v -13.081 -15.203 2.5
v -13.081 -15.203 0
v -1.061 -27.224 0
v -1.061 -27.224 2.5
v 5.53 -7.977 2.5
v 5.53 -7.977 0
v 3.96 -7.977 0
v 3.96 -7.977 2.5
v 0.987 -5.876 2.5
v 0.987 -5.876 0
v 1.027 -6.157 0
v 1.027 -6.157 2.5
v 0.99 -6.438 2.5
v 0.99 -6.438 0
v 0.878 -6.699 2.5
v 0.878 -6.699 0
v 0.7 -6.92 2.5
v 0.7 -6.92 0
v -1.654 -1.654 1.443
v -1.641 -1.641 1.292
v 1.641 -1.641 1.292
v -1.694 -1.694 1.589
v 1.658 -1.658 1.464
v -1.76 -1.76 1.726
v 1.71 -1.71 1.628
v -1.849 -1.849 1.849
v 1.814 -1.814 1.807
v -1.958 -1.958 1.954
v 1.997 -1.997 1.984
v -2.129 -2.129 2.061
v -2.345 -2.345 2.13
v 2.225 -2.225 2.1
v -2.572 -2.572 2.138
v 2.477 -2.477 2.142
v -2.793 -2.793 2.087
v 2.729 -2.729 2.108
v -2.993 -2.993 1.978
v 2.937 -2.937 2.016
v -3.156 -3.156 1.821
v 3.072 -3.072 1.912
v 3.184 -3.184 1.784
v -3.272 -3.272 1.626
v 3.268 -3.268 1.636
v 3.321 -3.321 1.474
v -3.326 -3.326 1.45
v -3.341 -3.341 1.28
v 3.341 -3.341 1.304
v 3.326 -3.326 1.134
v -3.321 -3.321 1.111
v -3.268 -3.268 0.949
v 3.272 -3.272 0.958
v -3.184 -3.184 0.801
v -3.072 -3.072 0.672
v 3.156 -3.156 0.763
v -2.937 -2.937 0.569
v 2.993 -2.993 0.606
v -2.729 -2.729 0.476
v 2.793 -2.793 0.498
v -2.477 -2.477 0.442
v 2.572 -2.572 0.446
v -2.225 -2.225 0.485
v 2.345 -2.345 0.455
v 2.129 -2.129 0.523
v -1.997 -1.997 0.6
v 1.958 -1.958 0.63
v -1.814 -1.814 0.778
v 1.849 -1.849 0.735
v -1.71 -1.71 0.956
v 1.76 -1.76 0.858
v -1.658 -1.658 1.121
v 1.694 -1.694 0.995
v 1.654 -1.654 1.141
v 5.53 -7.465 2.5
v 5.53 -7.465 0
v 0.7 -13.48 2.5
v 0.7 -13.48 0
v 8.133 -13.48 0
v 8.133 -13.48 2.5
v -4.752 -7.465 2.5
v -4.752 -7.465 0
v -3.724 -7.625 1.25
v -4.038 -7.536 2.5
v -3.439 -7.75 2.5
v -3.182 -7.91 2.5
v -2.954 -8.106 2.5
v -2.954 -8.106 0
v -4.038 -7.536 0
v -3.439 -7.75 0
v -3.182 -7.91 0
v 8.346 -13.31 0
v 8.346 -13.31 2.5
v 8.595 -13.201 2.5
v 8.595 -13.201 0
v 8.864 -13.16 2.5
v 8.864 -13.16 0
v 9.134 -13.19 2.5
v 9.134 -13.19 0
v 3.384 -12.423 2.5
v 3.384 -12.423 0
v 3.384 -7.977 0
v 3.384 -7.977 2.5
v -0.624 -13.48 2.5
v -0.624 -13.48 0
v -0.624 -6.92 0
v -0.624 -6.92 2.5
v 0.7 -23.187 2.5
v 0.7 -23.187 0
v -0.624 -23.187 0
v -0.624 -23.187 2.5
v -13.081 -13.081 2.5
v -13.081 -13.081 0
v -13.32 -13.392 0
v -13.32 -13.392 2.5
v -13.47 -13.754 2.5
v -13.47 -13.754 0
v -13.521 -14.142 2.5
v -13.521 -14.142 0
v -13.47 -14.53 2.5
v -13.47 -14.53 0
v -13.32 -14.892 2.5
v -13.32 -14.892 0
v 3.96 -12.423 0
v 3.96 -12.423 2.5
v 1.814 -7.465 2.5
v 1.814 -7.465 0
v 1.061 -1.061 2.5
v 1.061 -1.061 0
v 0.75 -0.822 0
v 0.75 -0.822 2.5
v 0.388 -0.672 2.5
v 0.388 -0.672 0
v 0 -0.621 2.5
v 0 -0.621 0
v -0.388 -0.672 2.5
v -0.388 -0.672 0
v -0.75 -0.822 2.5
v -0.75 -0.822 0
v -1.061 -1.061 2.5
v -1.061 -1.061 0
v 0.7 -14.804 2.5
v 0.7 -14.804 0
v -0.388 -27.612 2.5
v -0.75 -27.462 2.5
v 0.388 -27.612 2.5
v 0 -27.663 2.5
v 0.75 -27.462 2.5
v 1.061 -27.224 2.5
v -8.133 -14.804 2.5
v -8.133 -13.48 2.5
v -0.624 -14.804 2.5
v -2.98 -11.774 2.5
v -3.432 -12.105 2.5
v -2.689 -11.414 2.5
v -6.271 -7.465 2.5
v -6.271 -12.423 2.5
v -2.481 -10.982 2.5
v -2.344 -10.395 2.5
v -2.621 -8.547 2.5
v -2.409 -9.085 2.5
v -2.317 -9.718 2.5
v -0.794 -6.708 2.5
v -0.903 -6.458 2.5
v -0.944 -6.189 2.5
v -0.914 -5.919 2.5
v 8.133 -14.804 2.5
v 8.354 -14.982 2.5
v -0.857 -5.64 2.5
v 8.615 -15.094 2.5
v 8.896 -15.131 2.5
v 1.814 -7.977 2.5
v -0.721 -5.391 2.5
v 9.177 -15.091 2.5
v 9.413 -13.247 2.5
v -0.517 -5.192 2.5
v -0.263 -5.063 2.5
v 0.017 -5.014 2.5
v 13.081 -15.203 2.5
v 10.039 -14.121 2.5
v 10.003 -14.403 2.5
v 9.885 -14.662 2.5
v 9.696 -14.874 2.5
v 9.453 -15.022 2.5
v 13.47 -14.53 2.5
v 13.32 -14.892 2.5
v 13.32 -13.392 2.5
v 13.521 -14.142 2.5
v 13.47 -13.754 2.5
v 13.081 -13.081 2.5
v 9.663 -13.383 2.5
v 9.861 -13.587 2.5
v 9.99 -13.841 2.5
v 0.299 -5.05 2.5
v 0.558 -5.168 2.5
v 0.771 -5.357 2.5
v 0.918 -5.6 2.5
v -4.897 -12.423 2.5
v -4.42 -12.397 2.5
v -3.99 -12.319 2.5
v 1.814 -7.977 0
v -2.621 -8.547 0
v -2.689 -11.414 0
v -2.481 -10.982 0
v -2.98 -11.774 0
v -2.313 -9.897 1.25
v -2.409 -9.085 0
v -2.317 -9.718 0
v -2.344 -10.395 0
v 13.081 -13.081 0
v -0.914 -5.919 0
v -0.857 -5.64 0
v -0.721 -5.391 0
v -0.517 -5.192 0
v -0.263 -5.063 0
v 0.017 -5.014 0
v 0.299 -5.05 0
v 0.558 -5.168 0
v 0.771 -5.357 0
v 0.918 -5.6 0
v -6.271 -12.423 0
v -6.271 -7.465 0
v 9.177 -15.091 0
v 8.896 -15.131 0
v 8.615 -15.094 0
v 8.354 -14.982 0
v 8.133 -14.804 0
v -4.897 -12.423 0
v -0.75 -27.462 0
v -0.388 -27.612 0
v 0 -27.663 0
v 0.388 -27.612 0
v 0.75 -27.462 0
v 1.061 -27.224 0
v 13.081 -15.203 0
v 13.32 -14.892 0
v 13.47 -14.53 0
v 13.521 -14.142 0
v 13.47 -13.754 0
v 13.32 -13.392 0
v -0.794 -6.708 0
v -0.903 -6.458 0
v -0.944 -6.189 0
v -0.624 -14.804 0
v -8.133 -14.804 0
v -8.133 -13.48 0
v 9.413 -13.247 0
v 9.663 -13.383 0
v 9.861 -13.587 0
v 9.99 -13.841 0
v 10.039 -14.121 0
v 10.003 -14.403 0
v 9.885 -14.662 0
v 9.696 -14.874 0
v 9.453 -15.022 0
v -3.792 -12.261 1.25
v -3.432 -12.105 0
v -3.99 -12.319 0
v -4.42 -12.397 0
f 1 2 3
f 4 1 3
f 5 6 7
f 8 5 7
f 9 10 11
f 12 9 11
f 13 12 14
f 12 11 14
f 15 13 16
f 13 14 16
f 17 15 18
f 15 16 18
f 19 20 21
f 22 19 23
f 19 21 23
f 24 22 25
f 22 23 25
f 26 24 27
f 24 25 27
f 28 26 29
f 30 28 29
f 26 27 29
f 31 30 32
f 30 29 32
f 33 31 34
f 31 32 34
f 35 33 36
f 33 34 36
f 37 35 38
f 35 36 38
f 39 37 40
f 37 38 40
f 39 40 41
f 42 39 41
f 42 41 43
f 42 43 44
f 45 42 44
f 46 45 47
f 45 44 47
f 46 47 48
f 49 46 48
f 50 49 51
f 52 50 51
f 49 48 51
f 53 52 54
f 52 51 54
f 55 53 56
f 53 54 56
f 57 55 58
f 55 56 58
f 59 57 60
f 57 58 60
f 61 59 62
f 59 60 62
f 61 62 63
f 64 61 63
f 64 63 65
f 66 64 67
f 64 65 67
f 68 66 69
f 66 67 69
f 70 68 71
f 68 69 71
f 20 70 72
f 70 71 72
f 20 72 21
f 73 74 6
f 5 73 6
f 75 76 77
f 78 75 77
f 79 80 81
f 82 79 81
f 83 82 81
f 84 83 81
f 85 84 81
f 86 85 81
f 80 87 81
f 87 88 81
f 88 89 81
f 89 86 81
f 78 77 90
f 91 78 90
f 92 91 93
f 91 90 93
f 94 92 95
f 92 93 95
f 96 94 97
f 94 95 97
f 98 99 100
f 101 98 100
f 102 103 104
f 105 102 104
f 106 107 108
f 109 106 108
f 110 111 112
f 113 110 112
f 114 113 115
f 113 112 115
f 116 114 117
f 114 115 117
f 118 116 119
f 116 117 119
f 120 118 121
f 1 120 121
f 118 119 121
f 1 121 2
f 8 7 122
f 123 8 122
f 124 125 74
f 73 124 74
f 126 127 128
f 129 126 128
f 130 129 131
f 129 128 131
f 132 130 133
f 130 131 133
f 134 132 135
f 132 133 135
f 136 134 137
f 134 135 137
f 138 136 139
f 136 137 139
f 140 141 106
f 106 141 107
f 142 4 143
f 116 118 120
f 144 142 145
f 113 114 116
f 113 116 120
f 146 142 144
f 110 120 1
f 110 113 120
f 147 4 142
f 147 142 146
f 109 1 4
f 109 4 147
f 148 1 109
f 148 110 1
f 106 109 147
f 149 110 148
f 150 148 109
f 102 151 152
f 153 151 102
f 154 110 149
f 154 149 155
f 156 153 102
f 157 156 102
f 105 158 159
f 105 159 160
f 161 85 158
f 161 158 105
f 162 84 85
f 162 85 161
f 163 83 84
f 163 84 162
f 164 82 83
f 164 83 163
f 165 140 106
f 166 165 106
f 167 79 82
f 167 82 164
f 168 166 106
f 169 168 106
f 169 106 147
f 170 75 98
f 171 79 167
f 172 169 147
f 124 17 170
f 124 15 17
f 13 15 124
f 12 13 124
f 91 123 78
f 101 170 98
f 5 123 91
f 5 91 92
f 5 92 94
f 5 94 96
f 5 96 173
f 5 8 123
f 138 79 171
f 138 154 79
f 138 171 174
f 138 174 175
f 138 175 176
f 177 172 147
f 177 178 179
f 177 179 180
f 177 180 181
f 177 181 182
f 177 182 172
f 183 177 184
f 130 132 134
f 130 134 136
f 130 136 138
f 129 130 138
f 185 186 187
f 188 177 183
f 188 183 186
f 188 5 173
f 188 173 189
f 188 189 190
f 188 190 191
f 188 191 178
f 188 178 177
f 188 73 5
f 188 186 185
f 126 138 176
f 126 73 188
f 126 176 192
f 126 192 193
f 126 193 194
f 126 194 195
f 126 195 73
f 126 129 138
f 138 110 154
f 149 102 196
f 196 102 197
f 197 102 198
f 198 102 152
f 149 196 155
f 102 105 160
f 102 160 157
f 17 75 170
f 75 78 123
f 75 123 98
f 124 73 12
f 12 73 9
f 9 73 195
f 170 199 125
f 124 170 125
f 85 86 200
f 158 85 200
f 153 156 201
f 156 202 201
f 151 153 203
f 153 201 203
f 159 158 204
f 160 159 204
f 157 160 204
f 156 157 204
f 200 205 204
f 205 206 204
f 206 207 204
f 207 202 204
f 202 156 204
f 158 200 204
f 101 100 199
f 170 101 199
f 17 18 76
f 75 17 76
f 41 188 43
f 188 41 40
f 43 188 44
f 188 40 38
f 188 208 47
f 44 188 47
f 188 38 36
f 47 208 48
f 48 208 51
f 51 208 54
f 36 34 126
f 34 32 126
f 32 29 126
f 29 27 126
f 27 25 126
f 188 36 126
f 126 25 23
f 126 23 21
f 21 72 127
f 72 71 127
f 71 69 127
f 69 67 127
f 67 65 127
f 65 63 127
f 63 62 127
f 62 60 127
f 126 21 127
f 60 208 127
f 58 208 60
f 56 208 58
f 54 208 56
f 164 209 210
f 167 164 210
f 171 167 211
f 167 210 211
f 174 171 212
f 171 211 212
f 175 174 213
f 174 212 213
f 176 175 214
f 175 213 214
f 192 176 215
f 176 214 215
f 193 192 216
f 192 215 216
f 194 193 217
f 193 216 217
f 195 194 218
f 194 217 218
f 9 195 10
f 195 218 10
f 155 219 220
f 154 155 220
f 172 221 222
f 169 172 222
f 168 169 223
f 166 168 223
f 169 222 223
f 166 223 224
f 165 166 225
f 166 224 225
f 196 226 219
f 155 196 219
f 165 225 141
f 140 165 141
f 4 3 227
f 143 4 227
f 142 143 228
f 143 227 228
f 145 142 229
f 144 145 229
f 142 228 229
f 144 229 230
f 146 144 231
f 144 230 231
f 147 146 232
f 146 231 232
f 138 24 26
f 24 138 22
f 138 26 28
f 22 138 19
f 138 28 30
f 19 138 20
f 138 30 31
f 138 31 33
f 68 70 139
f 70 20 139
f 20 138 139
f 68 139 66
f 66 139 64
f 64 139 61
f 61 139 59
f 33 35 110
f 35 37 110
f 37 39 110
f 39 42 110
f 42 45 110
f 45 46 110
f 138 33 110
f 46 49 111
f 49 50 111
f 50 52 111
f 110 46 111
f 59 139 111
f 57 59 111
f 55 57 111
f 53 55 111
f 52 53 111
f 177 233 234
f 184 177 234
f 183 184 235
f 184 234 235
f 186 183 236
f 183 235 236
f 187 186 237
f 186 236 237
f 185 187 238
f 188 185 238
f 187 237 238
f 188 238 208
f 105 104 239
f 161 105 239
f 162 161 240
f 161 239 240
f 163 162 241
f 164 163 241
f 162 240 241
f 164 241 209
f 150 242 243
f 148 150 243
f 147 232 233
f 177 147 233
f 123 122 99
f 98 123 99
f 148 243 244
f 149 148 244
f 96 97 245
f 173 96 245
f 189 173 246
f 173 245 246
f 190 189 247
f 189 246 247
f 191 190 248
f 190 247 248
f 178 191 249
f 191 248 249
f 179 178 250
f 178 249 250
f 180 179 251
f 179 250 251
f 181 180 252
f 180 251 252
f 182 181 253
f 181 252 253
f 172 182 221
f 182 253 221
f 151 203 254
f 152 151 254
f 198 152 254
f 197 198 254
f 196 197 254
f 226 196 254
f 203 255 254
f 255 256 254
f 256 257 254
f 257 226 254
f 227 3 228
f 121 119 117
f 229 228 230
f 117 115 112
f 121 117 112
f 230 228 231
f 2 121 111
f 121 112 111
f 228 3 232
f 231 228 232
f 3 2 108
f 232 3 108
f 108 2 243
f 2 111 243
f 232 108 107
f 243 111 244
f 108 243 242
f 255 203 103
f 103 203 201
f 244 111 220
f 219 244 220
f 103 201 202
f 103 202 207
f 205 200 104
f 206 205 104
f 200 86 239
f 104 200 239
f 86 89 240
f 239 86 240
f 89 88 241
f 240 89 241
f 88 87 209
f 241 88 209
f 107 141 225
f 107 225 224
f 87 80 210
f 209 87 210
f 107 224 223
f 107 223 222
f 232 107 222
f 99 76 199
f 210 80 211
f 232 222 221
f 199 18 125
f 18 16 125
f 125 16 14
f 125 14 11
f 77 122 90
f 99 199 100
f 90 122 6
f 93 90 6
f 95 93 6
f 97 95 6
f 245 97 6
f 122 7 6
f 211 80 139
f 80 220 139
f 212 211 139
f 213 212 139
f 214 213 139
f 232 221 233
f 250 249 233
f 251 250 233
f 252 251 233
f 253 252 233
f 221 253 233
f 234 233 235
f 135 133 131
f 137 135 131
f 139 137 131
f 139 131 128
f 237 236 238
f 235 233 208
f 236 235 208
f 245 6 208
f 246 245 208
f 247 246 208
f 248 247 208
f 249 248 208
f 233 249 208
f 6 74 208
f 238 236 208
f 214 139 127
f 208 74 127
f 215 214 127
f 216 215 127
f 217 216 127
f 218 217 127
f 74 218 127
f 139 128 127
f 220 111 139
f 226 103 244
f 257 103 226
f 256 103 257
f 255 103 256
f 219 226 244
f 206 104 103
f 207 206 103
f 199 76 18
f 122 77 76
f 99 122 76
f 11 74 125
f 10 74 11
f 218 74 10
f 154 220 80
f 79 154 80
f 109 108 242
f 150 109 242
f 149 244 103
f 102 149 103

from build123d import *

# Parameters (mm, degrees)
F1_DEPTH = 2.5
F2_R     = 0.85
F3_DEPTH = 12.5


with BuildPart() as f1:
    # F0 (on Top) → F1 (new body)
    with BuildSketch(Plane.XY):
        with BuildLine():
            Line((13.081475452, -13.081475452), (1.0606601718, -1.0606601718))
            ThreePointArc((1.0606601718, -1.0606601718), (0, -0.6213203436), (-1.0606601718, -1.0606601718))
            Line((-1.0606601718, -1.0606601718), (-13.081475452, -13.081475452))
            ThreePointArc((-13.081475452, -13.081475452), (-13.5208152802, -14.1421356237), (-13.081475452, -15.2027957955))
            Line((-13.081475452, -15.2027957955), (-1.0606601718, -27.2236110757))
            ThreePointArc((-1.0606601718, -27.2236110757), (0, -27.6629509039), (1.0606601718, -27.2236110757))
            Line((1.0606601718, -27.2236110757), (13.081475452, -15.2027957955))
            ThreePointArc((13.081475452, -15.2027957955), (13.5208152802, -14.1421356237), (13.081475452, -13.081475452))
        make_face()
        with BuildLine():
            add(Edge.make_bspline(
                [(-2.95422167, -8.1059920208), (-2.3134881631, -8.7467255278), (-2.3134881631, -9.8968991389)],
                knots=[0, 0, 0, 1, 1, 1], degree=2))
            add(Edge.make_bspline(
                [(-2.3134881631, -9.8968991389), (-2.3134881631, -11.1241126806), (-2.9797208019, -11.7735267431)],
                knots=[0, 0, 0, 1, 1, 1], degree=2))
            add(Edge.make_bspline(
                [(-2.9797208019, -11.7735267431), (-3.6459534408, -12.4229408056), (-4.8970385103, -12.4229408056)],
                knots=[0, 0, 0, 1, 1, 1], degree=2))
            Line((-4.8970385103, -12.4229408056), (-6.2707364269, -12.4229408056))
            Line((-6.2707364269, -12.4229408056), (-6.2707364269, -7.4652585139))
            Line((-6.2707364269, -7.4652585139), (-4.7516392047, -7.4652585139))
            add(Edge.make_bspline(
                [(-4.7516392047, -7.4652585139), (-3.5949551769, -7.4652585139), (-2.95422167, -8.1059920208)],
                knots=[0, 0, 0, 1, 1, 1], degree=2))
        make_face(mode=Mode.SUBTRACT)
        with BuildLine():
            Line((-8.1334756687, -14.8039748892), (-8.1334756687, -13.4802963582))
            Line((-8.1334756687, -13.4802963582), (-0.6236797201, -13.4802963582))
            Line((-0.6236797201, -13.4802963582), (-0.6236797201, -6.9198086858))
            ThreePointArc((-0.6236797201, -6.9198086858), (-0.9032194318, -6.4583786209), (-0.9135835525, -5.9189782686))
            ThreePointArc((-0.9135835525, -5.9189782686), (0.0168397474, -5.0141534426), (0.9868078824, -5.876451129))
            ThreePointArc((0.9868078824, -5.876451129), (0.9900106564, -6.4384308628), (0.6999988109, -6.9198086858))
            Line((0.6999988109, -6.9198086858), (0.6999988109, -13.4802963582))
            Line((0.6999988109, -13.4802963582), (8.1334756687, -13.4802963582))
            ThreePointArc((8.1334756687, -13.4802963582), (8.5949057336, -13.2007566465), (9.134306086, -13.1903925258))
            ThreePointArc((9.134306086, -13.1903925258), (10.0391309119, -14.1208158258), (9.1768332255, -15.0907839607))
            ThreePointArc((9.1768332255, -15.0907839607), (8.6148534917, -15.0939867347), (8.1334756687, -14.8039748892))
            Line((8.1334756687, -14.8039748892), (0.6999988109, -14.8039748892))
            Line((0.6999988109, -14.8039748892), (0.6999988109, -23.1867600232))
            Line((0.6999988109, -23.1867600232), (-0.6236797201, -23.1867600232))
            Line((-0.6236797201, -23.1867600232), (-0.6236797201, -14.8039748892))
            Line((-0.6236797201, -14.8039748892), (-8.1334756687, -14.8039748892))
        make_face(mode=Mode.SUBTRACT)
        Polygon((3.9598674141, -7.9774117573), (3.9598674141, -12.4229412712), (3.3836955391, -12.4229412712), (3.3836955391, -7.9774117573), (1.813600053, -7.9774117573), (1.813600053, -7.4652589795), (5.5299629002, -7.4652589795), (5.5299629002, -7.9774117573), align=None, mode=Mode.SUBTRACT)
    extrude(amount=F1_DEPTH)

    # F2 (on Right) → F3 (cut, symmetric)
    with BuildSketch(Plane.YZ):
        with Locations((-2.4908210296, 1.292226194)):
            Circle(F2_R)
    extrude(amount=F3_DEPTH, both=True, mode=Mode.SUBTRACT)


solid = f1.part
